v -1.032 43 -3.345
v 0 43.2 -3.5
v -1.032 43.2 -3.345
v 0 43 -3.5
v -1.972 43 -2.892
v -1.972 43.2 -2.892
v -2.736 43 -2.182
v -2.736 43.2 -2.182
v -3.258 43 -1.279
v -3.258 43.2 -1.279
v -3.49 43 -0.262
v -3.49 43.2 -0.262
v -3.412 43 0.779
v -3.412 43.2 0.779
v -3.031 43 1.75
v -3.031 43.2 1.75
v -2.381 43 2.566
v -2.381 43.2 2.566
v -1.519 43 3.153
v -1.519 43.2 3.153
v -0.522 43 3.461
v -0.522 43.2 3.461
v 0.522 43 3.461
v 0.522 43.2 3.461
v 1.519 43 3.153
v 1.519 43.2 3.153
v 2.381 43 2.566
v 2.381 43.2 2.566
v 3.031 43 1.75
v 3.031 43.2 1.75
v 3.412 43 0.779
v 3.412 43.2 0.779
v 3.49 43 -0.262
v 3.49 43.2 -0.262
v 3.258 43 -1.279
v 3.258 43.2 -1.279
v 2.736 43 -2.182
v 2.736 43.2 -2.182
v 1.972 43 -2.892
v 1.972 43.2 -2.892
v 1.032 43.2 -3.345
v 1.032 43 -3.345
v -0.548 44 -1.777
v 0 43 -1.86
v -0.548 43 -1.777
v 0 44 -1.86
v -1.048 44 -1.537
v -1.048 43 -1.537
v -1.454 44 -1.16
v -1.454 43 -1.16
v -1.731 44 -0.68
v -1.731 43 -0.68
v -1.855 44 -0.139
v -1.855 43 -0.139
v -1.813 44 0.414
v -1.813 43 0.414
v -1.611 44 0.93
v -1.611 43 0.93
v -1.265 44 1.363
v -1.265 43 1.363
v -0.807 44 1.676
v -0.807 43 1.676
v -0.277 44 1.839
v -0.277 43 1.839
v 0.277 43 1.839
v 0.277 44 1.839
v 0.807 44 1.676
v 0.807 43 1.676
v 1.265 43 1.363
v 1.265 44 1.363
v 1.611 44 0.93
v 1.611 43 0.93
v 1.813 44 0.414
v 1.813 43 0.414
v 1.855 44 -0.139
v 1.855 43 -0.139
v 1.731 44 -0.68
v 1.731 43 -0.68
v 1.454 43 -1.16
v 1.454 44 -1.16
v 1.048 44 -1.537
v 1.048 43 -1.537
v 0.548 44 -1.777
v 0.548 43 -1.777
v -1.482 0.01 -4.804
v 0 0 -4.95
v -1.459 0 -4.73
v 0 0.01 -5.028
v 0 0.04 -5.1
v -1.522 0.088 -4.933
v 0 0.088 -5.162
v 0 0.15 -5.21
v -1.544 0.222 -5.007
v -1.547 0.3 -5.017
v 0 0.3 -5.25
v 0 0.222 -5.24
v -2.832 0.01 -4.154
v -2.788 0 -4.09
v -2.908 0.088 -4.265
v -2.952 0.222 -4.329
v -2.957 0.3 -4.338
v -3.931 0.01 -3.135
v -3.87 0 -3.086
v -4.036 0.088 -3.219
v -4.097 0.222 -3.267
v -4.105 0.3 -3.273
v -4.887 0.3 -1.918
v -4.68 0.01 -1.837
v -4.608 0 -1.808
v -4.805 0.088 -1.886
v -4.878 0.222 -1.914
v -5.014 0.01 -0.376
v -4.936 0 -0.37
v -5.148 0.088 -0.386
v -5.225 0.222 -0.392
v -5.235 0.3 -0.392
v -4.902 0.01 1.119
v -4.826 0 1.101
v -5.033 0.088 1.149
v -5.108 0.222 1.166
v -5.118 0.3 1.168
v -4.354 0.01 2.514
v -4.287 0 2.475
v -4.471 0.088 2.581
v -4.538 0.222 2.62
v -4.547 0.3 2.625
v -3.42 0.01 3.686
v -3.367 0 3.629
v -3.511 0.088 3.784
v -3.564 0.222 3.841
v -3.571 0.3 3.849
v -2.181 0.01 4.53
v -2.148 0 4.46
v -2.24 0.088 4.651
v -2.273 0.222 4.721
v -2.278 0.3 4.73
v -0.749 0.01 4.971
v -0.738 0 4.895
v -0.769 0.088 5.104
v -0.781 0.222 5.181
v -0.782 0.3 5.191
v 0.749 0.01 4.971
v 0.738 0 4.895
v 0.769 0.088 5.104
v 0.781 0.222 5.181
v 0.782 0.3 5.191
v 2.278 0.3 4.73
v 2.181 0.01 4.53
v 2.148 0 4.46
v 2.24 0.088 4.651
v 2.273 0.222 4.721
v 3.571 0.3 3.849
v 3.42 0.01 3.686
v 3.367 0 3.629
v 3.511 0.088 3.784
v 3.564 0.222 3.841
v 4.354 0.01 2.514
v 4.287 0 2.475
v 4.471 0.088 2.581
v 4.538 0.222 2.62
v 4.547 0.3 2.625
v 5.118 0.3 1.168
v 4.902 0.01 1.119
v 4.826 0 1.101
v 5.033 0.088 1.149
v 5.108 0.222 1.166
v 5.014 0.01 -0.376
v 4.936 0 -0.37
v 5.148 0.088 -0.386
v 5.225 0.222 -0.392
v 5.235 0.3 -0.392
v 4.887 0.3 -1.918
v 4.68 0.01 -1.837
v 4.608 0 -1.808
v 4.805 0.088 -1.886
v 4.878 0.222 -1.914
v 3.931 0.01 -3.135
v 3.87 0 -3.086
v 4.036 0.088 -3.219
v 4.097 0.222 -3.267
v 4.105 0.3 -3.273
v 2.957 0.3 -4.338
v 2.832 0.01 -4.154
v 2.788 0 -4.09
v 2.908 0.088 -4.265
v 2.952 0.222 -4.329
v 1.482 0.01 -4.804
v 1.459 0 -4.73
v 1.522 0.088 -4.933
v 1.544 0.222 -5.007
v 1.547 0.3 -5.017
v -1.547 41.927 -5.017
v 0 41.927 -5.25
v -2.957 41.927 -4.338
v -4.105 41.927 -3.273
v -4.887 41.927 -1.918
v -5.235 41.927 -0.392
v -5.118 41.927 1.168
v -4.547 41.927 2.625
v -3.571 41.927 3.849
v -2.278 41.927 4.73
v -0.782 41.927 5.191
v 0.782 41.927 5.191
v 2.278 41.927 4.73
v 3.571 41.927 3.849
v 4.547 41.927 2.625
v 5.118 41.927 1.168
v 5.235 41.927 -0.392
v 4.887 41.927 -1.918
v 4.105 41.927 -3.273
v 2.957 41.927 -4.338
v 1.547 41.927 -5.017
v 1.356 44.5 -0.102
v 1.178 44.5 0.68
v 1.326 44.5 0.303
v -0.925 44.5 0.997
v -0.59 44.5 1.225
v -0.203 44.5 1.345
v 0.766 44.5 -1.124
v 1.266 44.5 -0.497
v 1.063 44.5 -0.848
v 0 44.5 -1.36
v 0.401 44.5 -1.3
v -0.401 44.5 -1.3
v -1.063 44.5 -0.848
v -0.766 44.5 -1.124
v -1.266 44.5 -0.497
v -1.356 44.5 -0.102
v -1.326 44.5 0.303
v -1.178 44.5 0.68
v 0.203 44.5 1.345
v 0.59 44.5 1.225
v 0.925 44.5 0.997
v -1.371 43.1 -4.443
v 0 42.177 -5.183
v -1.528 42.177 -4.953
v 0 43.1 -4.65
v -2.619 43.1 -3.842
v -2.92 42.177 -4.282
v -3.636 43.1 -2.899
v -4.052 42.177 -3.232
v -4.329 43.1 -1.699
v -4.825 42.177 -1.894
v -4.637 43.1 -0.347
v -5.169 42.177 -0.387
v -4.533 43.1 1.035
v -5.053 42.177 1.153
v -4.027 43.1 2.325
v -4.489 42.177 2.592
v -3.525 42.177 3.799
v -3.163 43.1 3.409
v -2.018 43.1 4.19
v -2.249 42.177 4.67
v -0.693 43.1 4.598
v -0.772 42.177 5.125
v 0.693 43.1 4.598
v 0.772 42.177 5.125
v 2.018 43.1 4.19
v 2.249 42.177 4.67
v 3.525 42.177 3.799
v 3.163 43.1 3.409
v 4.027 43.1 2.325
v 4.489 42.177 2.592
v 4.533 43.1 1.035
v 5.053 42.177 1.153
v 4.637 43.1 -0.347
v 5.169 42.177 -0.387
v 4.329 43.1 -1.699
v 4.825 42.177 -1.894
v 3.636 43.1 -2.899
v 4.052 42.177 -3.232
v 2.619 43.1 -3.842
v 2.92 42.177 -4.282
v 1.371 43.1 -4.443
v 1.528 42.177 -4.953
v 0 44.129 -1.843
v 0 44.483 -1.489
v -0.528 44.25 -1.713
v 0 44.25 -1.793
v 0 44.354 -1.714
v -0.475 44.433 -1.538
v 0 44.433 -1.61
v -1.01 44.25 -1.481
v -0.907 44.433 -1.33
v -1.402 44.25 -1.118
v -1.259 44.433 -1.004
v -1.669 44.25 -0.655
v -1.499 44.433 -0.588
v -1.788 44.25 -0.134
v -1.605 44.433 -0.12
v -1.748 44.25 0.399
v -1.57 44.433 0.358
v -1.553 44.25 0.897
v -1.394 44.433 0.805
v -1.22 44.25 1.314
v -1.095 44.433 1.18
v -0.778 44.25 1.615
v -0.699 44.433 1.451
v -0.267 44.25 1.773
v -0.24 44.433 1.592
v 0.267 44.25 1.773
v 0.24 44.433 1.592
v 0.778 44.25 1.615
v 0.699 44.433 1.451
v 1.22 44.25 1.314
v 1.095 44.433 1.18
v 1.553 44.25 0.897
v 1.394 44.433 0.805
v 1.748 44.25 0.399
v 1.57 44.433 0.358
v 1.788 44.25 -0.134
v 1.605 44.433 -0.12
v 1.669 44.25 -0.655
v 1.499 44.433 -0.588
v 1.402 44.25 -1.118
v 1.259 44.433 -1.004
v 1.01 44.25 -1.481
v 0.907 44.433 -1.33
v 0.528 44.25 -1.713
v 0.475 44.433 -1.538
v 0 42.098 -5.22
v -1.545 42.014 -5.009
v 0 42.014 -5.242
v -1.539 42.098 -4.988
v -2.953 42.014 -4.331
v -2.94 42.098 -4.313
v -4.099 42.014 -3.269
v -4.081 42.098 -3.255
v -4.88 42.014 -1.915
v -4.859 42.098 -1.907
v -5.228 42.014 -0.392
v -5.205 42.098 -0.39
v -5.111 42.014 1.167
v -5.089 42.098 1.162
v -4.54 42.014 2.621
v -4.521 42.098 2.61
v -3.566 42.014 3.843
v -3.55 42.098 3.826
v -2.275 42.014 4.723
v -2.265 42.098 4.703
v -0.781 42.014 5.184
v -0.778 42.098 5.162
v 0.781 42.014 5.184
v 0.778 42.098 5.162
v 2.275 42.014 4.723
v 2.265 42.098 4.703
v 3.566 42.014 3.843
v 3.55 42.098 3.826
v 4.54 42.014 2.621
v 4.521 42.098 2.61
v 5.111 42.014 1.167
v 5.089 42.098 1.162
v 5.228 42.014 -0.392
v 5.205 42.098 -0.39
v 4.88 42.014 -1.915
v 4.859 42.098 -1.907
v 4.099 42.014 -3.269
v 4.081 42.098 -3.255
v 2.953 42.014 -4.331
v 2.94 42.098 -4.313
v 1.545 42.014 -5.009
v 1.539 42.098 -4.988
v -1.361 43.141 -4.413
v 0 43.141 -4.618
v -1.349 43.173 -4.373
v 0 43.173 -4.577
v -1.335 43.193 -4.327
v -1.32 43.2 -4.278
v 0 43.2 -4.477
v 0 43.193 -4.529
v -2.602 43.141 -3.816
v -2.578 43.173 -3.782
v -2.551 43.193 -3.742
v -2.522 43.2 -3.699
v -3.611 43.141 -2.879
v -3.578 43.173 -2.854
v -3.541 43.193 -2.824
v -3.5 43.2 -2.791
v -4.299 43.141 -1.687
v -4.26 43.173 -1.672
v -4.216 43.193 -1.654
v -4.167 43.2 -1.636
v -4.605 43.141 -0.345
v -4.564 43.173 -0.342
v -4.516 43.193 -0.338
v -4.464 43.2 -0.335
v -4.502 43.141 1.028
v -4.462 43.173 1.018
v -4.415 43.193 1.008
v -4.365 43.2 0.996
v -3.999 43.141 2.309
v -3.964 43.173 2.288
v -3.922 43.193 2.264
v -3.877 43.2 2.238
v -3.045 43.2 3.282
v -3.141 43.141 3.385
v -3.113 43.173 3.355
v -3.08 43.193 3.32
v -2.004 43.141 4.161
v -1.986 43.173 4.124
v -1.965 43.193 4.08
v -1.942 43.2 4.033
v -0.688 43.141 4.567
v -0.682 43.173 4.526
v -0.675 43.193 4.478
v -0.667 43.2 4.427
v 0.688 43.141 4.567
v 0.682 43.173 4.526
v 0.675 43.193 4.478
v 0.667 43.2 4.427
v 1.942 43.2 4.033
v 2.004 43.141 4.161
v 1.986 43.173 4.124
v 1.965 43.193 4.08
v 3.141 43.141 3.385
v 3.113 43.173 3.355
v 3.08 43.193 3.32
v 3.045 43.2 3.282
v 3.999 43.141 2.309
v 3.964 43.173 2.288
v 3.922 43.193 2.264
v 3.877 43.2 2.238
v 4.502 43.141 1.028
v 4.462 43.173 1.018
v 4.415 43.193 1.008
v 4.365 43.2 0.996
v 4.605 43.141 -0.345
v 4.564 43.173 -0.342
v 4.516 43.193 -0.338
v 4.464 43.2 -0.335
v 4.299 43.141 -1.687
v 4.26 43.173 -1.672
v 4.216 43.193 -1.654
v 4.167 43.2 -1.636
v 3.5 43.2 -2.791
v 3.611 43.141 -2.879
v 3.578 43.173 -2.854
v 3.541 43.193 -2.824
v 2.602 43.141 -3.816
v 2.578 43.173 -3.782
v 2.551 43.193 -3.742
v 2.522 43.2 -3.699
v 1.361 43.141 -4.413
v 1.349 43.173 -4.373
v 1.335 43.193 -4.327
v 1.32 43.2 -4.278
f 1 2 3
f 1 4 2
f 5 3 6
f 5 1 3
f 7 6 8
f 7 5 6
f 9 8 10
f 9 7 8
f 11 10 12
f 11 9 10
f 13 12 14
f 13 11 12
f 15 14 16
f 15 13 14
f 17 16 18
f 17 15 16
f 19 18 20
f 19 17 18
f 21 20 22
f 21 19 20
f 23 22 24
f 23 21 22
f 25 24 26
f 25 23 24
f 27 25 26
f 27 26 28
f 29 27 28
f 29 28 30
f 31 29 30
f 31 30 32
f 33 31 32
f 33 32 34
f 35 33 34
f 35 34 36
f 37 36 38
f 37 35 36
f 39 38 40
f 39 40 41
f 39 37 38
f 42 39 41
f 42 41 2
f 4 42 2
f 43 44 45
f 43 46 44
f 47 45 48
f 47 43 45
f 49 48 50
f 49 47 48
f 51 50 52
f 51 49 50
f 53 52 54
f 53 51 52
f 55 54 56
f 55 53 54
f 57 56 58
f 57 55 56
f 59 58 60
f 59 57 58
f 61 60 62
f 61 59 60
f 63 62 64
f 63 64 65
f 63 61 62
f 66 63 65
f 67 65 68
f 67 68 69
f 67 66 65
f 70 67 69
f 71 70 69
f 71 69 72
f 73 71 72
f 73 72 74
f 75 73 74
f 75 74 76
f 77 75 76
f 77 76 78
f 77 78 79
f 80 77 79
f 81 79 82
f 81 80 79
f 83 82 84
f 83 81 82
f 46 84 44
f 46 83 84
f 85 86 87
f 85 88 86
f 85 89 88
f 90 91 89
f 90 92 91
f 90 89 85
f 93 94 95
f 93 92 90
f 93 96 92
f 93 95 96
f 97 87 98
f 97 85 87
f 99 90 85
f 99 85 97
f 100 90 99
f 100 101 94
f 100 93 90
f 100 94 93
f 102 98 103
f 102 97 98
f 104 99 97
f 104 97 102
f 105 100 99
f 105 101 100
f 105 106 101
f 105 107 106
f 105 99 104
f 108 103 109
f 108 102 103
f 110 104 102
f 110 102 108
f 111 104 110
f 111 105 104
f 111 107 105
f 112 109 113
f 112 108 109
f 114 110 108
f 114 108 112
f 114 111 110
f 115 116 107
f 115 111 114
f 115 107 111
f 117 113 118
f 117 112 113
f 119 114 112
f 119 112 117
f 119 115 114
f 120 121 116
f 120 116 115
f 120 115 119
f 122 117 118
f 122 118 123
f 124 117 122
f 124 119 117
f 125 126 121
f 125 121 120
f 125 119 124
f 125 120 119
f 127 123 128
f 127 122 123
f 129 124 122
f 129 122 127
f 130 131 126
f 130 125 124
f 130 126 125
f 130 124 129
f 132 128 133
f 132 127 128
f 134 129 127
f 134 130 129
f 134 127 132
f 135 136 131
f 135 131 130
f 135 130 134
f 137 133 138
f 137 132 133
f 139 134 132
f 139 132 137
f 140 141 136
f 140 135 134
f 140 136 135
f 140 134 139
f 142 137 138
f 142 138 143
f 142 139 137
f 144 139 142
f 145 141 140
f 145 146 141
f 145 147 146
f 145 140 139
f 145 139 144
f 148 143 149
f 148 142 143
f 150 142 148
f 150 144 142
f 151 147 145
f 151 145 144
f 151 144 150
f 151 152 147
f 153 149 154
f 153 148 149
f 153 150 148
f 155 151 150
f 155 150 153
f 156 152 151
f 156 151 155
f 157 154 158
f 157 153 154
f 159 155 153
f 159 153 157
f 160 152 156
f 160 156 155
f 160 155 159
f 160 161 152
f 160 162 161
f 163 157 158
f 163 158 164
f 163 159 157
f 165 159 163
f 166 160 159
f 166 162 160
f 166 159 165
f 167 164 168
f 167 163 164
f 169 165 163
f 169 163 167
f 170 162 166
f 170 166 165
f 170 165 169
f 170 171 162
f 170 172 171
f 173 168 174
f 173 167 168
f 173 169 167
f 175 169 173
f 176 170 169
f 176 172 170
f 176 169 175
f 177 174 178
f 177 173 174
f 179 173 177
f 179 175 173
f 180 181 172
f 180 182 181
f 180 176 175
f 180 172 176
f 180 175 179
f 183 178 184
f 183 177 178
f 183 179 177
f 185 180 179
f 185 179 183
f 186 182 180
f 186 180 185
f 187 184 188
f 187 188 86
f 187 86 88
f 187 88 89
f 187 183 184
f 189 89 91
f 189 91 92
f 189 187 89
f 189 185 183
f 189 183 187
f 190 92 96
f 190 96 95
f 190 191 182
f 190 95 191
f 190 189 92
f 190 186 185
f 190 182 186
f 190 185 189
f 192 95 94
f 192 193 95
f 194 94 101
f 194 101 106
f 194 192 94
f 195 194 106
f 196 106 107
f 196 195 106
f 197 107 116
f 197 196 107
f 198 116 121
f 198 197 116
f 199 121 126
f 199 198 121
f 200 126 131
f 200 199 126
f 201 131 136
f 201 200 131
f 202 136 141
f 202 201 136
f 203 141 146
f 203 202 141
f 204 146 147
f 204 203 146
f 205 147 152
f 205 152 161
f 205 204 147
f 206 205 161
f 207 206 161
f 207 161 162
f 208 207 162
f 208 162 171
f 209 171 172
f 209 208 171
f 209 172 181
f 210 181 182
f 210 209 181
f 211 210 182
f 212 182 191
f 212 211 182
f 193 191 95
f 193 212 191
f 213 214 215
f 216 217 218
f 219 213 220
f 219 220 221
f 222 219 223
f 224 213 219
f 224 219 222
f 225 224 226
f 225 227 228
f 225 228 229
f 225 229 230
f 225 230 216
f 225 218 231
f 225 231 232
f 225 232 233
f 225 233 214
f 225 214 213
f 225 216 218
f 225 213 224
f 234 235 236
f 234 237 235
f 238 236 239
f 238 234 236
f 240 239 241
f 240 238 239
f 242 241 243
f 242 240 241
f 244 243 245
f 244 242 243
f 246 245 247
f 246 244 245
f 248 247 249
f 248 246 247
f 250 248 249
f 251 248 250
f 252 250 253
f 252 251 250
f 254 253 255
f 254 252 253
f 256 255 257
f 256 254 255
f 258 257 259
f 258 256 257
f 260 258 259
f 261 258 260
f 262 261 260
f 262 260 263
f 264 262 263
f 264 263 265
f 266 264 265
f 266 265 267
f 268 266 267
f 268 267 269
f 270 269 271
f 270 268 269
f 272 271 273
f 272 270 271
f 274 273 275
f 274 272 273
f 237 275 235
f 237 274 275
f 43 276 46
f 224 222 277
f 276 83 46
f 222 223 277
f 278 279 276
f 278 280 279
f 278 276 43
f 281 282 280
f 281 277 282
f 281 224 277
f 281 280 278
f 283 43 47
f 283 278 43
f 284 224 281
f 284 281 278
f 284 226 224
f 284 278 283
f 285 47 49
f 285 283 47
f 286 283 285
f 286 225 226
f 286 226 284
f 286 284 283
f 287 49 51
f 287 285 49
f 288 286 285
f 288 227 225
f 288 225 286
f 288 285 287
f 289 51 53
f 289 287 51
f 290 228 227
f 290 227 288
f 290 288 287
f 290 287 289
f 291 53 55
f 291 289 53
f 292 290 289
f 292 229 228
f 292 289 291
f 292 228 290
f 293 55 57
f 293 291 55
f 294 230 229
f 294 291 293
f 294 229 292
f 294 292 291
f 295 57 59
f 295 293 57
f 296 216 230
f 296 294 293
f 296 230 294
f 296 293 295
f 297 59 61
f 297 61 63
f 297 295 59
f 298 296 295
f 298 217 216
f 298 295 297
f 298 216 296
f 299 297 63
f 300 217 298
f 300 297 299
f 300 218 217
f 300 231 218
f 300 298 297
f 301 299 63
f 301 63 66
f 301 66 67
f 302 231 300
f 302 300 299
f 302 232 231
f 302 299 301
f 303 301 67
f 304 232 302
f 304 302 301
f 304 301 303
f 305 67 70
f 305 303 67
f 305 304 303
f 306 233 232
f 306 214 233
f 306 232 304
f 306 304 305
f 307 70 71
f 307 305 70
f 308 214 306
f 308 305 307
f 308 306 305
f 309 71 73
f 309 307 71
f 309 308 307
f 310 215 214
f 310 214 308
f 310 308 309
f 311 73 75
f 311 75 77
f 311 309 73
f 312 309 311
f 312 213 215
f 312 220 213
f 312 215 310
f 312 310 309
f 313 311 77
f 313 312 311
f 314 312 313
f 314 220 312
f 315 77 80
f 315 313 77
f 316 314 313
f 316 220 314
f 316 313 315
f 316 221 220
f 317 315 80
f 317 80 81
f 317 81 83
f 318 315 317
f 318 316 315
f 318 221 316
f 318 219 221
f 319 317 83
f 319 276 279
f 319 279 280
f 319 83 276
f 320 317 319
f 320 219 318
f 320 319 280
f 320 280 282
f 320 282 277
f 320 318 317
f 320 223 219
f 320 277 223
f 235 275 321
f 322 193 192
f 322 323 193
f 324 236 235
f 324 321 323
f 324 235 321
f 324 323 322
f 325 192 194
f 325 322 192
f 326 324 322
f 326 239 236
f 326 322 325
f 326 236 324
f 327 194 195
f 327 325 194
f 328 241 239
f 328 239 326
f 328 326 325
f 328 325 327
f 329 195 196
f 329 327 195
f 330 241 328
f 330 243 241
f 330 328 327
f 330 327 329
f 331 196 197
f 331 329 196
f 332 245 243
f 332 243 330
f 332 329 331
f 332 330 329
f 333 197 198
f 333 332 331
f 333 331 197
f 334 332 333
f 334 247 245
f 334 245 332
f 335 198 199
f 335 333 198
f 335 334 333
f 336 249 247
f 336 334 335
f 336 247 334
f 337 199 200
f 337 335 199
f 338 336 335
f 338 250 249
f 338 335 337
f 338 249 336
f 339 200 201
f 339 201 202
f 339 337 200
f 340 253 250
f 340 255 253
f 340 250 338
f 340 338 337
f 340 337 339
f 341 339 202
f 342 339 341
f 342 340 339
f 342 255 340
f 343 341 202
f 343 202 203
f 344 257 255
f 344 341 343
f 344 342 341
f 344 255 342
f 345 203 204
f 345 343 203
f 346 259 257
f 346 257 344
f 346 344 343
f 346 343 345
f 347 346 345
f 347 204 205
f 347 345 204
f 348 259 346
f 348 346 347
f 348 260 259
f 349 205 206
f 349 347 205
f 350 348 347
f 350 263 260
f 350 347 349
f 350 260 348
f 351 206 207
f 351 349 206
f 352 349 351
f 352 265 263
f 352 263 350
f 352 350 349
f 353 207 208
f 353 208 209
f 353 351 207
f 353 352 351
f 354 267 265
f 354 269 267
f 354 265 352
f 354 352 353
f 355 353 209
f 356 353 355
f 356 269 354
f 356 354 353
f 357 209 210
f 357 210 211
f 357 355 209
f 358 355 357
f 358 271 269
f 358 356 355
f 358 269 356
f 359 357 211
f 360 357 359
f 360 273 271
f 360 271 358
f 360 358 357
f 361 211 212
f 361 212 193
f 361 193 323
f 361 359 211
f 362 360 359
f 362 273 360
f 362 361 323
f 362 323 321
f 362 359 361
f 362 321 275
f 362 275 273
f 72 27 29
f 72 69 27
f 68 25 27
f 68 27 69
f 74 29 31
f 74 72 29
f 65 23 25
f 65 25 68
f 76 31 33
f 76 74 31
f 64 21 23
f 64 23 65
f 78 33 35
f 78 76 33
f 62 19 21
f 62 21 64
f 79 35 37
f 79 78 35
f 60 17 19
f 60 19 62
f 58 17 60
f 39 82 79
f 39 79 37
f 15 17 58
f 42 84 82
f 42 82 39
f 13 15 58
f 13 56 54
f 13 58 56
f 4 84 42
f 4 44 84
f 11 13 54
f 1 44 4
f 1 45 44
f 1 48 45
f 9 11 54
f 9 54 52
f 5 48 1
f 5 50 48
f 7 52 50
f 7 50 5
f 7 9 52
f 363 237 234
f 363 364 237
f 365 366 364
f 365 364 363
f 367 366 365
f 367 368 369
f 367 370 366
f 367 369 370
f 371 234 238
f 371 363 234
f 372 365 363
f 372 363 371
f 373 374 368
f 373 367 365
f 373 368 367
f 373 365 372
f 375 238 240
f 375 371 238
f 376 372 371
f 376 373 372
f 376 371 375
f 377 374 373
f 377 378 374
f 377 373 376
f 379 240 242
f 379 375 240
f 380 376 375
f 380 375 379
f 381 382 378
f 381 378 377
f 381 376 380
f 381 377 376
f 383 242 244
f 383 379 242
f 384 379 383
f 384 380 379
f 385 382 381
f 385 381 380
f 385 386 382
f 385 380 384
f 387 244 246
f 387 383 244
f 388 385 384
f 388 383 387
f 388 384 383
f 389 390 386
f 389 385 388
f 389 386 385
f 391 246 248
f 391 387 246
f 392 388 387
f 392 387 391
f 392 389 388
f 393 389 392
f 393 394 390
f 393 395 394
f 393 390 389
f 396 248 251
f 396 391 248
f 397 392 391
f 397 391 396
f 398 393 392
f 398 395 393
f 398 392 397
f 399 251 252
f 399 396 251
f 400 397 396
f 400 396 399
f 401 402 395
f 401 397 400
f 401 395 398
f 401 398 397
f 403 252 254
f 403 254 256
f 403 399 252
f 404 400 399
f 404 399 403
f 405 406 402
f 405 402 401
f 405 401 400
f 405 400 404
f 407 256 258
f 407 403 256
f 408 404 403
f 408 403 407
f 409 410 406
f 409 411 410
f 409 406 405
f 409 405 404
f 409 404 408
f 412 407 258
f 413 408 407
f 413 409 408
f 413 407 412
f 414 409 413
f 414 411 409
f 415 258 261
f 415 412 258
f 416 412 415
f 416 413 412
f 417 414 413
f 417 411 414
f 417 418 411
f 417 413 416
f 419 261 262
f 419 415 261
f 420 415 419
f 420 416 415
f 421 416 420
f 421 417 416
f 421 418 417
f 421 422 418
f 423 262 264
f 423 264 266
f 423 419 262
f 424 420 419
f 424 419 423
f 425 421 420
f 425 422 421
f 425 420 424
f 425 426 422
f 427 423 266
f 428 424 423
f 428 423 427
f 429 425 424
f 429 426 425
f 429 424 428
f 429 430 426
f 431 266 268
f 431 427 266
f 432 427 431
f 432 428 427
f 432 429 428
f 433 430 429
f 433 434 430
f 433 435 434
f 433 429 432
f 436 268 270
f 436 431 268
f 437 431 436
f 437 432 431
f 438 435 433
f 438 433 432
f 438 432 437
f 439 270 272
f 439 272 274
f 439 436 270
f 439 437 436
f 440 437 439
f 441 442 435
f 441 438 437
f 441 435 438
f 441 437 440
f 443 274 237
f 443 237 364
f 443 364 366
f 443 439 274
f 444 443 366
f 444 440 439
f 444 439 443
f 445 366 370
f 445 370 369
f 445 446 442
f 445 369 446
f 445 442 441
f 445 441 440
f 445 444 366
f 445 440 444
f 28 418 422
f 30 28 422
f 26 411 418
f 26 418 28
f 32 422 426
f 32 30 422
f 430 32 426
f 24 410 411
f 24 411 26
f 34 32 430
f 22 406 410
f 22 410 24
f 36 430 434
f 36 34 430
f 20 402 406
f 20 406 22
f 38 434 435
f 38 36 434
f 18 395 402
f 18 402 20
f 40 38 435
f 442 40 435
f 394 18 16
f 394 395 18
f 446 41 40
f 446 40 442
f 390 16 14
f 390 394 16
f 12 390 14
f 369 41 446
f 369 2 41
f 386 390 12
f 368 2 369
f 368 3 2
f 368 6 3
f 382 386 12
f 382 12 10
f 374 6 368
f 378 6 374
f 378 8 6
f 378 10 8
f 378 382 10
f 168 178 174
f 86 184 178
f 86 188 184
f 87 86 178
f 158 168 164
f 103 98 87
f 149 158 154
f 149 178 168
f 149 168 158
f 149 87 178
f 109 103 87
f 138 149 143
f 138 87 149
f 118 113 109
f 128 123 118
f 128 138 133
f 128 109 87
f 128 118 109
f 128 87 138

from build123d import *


with BuildPart() as part:
    # Esquisse1 → Révolution1 (revolve)
    with BuildSketch(Plane.XY):
        with BuildLine():
            Line((-1.36, 44.5), (0, 44.5))
            Line((0, 44.5), (0, 0))
            Line((0, 0), (-4.95, 0))
            ThreePointArc((-4.95, 0), (-5.162132034, 0.087867966), (-5.25, 0.3))
            Line((-5.25, 0.3), (-5.25, 41.926794919))
            ThreePointArc((-5.25, 41.926794919), (-5.232962913, 42.056204442), (-5.183012702, 42.176794919))
            Line((-5.183012702, 42.176794919), (-4.65, 43.1))
            ThreePointArc((-4.65, 43.1), (-4.576794919, 43.173205081), (-4.476794919, 43.2))
            Line((-4.476794919, 43.2), (-3.5, 43.2))
            Line((-3.5, 43.2), (-3.5, 43))
            Line((-3.5, 43), (-1.86, 43))
            Line((-1.86, 43), (-1.86, 44))
            ThreePointArc((-1.86, 44), (-1.713553391, 44.353553391), (-1.36, 44.5))
        make_face()
    revolve(axis=Axis((0, 0, 0), (0, 1, 0)))


solid = part.part
